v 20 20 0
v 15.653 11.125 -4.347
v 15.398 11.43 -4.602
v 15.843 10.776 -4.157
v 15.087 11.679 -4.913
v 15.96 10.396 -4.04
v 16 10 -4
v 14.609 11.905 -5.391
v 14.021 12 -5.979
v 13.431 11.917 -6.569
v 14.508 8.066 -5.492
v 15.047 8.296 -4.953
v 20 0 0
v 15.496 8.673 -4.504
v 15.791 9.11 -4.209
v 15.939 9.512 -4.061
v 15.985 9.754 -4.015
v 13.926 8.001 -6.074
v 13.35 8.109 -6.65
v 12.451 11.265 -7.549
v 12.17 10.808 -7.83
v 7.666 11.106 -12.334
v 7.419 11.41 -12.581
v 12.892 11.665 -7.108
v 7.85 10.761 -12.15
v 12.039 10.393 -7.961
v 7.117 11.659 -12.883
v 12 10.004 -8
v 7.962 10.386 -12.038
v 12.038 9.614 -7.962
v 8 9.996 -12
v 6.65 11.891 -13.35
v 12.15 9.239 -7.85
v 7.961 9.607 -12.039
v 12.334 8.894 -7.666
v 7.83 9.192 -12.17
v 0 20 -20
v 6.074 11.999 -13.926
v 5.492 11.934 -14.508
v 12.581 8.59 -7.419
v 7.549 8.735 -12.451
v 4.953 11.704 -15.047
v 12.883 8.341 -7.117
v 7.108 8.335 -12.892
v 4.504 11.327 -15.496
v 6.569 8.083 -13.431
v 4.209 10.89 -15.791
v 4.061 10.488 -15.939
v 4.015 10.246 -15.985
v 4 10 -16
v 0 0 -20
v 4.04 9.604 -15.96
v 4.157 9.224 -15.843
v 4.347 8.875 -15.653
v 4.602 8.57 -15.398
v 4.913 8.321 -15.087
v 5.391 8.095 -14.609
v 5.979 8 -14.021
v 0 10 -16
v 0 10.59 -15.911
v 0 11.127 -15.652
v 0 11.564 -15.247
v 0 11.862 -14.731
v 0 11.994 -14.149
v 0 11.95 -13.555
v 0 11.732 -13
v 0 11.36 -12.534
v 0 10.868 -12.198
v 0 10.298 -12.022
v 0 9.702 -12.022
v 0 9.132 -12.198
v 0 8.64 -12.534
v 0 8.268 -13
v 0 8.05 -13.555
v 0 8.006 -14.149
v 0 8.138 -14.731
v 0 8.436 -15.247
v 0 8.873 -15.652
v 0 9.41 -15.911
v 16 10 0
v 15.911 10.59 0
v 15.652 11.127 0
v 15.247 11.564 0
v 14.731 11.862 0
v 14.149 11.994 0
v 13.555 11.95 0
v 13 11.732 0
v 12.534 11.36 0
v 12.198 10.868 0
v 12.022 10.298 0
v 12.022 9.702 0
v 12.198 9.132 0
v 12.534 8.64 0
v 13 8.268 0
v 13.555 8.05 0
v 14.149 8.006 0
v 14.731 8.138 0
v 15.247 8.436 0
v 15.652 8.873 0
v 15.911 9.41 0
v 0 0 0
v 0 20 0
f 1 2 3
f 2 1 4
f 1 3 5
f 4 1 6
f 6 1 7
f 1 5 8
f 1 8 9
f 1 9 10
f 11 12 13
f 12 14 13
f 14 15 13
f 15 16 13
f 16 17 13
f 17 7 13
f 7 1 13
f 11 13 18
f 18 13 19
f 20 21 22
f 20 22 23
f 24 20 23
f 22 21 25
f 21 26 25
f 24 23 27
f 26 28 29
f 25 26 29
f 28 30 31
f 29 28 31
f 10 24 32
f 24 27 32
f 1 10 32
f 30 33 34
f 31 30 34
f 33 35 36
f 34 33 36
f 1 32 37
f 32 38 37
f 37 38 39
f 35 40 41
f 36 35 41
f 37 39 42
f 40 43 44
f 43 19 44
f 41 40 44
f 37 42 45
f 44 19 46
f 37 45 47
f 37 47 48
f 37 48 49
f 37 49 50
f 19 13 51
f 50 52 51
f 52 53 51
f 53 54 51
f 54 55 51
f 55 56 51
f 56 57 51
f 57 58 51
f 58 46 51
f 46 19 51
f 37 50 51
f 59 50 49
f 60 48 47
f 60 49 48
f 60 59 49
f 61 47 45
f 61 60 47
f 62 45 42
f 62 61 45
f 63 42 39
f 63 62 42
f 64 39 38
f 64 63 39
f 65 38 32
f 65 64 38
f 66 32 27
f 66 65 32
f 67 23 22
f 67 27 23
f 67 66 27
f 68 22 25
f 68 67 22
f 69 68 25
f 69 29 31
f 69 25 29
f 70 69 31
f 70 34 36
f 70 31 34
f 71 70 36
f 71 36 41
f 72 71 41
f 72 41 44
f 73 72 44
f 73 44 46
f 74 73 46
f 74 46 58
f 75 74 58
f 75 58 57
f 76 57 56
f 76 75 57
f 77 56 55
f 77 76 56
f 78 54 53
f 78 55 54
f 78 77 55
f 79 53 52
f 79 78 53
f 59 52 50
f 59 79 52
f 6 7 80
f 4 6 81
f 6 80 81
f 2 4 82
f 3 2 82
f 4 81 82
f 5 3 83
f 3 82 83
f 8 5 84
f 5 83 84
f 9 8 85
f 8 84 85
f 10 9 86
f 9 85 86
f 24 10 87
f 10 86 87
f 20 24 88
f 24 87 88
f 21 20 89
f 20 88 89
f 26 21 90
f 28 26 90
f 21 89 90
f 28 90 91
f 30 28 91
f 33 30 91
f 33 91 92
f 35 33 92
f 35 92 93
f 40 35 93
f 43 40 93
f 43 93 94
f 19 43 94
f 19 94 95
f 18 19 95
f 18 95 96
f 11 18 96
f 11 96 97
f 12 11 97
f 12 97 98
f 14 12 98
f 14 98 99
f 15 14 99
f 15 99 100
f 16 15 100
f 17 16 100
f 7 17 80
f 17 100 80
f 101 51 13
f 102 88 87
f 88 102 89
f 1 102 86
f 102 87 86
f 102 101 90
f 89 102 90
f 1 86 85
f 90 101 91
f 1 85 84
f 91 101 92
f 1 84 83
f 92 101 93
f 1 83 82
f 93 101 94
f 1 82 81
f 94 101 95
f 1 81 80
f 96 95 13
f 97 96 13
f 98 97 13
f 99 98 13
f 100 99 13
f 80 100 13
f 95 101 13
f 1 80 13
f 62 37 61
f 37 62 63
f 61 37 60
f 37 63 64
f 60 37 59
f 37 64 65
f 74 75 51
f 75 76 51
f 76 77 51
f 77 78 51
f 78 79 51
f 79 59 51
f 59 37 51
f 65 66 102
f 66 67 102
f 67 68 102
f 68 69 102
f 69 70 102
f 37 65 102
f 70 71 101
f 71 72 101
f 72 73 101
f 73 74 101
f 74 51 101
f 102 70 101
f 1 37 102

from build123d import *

# Parameters (mm, degrees)
BOSS_EXTRUDE1_DEPTH = 20
SKETCH2_R           = 2
CUT_EXTRUDE1_DEPTH  = 35.641016151


with BuildPart() as part:
    # Sketch1 → Boss-Extrude1 (new body)
    with BuildSketch(Plane(origin=(0, 0, 0), x_dir=(1, 0, 0), z_dir=(0, 1, 0))):
        Polygon((0, 20), (0, 0), (20, 0), align=None)
    extrude(amount=BOSS_EXTRUDE1_DEPTH)

    # Sketch2 → Cut-Extrude1 (cut, through all)
    with BuildSketch(Plane.XY):
        with Locations((14, 10)):
            Circle(SKETCH2_R)
    cut_extrude1 = extrude(amount=-CUT_EXTRUDE1_DEPTH, mode=Mode.SUBTRACT)

    # Mirror1: Cut-Extrude1 across plane
    add(cut_extrude1.mirror(Plane(origin=(0, 0, 0), x_dir=(-0.7071067811865475, 0, 0.7071067811865476), z_dir=(0.7071067811865478, 0, 0.7071067811865474))), mode=Mode.SUBTRACT)


solid = part.part
